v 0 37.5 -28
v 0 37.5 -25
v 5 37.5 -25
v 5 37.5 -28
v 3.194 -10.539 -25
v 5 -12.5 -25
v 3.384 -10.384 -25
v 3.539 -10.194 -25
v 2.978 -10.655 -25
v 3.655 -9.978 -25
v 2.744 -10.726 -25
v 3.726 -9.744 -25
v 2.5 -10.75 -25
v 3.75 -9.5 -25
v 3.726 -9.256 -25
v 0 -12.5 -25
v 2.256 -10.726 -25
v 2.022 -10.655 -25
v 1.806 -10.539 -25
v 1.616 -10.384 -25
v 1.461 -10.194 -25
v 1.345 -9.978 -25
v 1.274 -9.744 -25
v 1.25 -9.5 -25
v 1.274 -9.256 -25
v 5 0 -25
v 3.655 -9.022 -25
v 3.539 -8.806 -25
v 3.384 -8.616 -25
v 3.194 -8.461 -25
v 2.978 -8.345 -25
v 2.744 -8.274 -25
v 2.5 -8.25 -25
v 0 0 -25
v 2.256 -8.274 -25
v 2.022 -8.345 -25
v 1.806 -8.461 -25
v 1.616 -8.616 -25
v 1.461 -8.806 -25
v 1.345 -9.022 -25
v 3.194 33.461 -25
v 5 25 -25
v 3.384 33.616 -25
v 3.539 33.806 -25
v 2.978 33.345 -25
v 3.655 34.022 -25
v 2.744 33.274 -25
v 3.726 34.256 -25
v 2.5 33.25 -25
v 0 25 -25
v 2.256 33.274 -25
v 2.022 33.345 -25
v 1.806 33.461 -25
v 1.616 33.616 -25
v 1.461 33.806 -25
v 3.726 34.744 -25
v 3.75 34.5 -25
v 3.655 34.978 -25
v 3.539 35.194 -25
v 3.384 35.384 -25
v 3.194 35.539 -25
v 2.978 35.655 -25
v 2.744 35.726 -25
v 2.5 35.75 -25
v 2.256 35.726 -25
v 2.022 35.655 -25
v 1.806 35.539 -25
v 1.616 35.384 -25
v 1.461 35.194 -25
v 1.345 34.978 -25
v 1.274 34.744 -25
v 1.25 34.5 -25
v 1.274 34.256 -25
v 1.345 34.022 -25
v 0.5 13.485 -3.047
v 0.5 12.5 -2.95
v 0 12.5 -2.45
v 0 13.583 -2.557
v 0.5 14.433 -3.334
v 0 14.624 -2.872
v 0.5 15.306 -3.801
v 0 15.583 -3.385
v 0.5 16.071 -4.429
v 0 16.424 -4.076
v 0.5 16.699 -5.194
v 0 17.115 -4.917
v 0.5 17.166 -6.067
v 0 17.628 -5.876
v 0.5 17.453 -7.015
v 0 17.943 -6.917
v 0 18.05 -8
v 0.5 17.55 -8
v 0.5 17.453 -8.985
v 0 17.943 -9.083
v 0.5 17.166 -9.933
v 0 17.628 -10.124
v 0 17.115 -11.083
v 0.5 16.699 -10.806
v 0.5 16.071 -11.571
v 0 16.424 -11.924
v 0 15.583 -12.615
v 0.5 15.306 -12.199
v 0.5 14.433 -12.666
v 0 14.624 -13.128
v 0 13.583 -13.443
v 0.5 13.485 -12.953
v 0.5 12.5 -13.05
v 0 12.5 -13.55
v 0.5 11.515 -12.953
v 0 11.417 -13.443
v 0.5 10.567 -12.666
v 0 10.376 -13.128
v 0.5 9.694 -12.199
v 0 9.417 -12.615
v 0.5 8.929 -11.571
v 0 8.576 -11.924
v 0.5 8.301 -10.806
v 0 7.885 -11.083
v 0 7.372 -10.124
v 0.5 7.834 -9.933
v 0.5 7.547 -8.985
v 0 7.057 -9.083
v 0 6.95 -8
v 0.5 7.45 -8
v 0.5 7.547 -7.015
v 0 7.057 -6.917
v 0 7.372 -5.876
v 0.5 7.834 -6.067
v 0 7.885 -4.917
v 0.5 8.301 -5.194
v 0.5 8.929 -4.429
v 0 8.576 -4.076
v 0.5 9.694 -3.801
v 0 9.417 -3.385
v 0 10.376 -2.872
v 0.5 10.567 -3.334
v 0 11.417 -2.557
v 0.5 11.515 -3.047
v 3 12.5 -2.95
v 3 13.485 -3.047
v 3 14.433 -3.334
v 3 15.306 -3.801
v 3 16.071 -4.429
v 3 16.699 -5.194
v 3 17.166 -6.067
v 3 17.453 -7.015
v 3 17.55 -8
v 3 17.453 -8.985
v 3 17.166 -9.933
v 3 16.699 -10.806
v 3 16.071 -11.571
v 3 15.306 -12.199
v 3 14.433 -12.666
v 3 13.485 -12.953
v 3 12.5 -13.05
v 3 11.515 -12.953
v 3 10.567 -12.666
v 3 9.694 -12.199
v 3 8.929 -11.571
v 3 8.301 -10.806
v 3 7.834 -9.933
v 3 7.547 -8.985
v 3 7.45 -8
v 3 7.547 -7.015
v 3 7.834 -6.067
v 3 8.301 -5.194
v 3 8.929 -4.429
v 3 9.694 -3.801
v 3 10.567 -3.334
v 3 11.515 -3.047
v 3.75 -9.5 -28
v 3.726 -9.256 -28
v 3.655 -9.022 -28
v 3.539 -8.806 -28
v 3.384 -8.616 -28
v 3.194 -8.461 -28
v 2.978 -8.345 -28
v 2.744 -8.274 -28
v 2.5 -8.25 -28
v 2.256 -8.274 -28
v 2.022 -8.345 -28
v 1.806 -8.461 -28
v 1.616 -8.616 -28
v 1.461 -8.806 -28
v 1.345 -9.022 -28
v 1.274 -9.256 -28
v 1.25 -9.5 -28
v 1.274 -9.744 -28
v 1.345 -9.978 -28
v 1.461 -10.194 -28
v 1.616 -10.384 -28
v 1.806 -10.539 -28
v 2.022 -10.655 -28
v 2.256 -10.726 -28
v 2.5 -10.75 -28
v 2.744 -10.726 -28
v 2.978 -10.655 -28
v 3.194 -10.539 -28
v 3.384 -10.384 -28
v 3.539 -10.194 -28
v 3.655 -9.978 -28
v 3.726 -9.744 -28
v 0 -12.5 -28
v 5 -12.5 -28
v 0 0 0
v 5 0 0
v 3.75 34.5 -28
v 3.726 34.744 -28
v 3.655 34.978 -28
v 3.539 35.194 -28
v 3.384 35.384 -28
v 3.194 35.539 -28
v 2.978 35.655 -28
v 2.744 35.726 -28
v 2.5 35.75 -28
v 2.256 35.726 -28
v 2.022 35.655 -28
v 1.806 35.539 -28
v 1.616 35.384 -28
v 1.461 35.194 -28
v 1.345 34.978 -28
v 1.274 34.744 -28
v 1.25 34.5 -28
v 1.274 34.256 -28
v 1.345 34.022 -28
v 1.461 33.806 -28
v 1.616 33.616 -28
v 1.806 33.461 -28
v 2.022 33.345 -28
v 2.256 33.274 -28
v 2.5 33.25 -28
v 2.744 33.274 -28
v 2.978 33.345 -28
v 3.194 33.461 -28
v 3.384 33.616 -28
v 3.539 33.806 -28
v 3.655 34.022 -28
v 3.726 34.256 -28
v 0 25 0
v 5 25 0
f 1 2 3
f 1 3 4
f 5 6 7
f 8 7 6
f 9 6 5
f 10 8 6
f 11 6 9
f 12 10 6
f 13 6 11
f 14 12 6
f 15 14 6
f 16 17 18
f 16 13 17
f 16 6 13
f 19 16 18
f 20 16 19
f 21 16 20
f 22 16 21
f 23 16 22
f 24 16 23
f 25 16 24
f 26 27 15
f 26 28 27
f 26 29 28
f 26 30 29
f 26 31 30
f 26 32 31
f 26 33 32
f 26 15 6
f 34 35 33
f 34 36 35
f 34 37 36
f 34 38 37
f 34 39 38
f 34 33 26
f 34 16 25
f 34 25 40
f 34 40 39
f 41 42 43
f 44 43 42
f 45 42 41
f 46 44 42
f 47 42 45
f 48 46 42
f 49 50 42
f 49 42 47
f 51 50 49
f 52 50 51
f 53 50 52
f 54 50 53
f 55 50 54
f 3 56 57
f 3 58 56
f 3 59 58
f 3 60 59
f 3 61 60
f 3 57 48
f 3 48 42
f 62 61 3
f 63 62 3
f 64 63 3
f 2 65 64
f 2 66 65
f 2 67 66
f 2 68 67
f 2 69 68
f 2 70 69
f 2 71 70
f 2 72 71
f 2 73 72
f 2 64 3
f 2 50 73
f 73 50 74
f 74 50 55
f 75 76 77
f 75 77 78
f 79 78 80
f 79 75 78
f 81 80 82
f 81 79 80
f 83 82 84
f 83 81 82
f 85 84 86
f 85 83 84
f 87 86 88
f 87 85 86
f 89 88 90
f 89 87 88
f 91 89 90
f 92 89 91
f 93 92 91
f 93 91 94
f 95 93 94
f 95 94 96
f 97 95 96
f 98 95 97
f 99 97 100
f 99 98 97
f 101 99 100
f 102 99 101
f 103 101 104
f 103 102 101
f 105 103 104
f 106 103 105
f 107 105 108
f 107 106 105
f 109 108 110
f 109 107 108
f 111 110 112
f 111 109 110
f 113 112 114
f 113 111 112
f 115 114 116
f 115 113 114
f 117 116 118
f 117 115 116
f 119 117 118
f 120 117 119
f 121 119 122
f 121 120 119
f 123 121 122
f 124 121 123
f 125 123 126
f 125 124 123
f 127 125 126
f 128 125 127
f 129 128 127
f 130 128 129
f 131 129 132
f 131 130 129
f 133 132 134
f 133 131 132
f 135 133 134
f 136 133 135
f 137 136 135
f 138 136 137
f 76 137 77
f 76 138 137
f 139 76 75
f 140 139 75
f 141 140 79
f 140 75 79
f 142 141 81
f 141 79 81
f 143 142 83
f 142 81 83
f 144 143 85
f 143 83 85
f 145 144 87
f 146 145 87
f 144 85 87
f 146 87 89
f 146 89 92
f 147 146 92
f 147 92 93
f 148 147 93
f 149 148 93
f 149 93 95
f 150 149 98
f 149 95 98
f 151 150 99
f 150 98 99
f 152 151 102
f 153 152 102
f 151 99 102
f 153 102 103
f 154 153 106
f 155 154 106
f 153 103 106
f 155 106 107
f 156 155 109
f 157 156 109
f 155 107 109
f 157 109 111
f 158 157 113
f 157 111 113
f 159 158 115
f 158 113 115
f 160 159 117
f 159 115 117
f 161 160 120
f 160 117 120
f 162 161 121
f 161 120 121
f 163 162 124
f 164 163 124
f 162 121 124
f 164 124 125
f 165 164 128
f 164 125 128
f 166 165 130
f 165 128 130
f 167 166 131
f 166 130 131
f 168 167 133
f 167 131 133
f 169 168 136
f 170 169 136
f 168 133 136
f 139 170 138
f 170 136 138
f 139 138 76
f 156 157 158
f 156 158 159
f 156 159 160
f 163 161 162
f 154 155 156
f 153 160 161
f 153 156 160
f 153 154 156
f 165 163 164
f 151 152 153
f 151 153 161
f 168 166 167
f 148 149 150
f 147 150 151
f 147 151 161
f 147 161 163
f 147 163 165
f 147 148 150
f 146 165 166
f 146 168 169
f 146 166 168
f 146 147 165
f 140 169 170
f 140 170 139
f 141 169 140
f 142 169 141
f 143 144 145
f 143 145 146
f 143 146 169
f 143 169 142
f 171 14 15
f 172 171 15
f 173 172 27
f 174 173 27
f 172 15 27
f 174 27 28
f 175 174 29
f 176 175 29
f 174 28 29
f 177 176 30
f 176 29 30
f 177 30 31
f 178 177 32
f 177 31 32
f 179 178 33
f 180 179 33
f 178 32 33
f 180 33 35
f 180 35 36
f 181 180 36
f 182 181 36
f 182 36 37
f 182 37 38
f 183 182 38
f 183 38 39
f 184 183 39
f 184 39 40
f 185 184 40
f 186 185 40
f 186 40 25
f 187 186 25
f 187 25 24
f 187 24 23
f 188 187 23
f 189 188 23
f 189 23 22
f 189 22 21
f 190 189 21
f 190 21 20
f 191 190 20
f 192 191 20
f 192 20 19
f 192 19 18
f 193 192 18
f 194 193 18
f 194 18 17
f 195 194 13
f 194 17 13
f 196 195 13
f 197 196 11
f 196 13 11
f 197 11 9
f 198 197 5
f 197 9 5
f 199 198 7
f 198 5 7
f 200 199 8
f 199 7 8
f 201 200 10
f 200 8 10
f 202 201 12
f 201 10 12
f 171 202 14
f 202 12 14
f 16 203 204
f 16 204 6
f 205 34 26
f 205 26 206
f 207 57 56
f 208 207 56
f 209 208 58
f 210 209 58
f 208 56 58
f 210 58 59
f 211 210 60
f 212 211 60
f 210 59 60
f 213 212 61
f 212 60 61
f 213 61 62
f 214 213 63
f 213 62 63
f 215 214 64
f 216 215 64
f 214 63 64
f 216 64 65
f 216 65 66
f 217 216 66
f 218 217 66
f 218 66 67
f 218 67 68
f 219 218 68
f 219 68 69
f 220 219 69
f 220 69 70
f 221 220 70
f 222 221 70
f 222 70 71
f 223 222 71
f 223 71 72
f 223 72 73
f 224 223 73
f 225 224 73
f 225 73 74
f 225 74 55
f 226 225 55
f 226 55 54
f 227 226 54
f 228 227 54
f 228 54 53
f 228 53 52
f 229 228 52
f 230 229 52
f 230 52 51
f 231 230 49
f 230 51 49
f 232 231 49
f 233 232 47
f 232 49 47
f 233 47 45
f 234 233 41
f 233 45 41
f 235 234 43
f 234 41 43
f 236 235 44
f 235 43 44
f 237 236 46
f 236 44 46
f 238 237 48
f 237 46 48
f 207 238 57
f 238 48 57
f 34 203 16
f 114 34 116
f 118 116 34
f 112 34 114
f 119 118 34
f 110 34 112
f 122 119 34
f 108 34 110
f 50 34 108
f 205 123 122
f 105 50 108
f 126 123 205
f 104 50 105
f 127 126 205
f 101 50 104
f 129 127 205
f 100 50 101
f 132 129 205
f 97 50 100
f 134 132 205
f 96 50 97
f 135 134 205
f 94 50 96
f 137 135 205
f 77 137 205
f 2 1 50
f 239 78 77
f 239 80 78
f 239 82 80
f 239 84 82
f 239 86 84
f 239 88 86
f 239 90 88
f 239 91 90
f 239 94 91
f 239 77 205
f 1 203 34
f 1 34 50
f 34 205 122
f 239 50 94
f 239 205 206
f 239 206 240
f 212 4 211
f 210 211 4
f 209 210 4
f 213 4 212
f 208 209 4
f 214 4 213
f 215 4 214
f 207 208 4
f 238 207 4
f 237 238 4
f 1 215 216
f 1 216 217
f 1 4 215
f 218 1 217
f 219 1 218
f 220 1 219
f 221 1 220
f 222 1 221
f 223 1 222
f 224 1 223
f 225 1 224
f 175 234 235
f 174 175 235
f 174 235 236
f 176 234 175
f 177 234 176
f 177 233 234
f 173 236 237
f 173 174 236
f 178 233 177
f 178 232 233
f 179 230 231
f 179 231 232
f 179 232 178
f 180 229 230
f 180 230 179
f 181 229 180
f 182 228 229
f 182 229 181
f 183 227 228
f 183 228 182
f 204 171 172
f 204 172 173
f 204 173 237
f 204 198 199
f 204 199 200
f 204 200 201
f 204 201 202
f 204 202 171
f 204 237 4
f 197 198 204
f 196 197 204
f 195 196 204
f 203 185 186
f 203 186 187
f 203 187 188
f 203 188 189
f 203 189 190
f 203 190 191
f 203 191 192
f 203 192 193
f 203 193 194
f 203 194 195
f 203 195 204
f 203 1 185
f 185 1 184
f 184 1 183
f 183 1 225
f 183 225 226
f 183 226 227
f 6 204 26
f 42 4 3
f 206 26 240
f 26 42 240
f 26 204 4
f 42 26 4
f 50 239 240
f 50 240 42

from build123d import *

# Parameters (mm, degrees)
EXTRUDE_2_DEPTH     = 5
SKETCH_2_R          = 1.25
CUT_EXTRUDE_1_DEPTH = 4
SKETCH_3_R          = 5.05
CUT_EXTRUDE_2_DEPTH = 3
CHAMFER_1_SIZE      = 0.5


with BuildPart() as part:
    # 草图1 → 凸台-拉伸2 (new body)
    with BuildSketch(Plane(origin=(0, 0, 0), x_dir=(0, 0, -1), z_dir=(1, 0, 0))):
        Polygon((25, 25), (25, 37.5), (28, 37.5), (28, -12.5), (25, -12.5), (25, 0), (0, 0), (0, 25), align=None)
    extrude(amount=EXTRUDE_2_DEPTH)

    # 草图2 → 切除-拉伸1 (cut)
    with BuildSketch(Plane.XY.offset(-25)):
        with Locations((2.5, 34.5)):
            Circle(SKETCH_2_R)
        with Locations((2.5, -9.5)):
            Circle(SKETCH_2_R)
    extrude(amount=-CUT_EXTRUDE_1_DEPTH, mode=Mode.SUBTRACT)

    # 草图3 → 切除-拉伸2 (cut)
    with BuildSketch(Plane.ZY):
        with Locations((-8, 12.5)):
            Circle(SKETCH_3_R)
    extrude(amount=-CUT_EXTRUDE_2_DEPTH, mode=Mode.SUBTRACT)

    # 倒角1
    chamfer_1_edges = [part.edges().sort_by_distance(p)[0] for p in [
        (0, 12.5, -13.05),
    ]]
    chamfer(chamfer_1_edges, length=CHAMFER_1_SIZE)


solid = part.part
